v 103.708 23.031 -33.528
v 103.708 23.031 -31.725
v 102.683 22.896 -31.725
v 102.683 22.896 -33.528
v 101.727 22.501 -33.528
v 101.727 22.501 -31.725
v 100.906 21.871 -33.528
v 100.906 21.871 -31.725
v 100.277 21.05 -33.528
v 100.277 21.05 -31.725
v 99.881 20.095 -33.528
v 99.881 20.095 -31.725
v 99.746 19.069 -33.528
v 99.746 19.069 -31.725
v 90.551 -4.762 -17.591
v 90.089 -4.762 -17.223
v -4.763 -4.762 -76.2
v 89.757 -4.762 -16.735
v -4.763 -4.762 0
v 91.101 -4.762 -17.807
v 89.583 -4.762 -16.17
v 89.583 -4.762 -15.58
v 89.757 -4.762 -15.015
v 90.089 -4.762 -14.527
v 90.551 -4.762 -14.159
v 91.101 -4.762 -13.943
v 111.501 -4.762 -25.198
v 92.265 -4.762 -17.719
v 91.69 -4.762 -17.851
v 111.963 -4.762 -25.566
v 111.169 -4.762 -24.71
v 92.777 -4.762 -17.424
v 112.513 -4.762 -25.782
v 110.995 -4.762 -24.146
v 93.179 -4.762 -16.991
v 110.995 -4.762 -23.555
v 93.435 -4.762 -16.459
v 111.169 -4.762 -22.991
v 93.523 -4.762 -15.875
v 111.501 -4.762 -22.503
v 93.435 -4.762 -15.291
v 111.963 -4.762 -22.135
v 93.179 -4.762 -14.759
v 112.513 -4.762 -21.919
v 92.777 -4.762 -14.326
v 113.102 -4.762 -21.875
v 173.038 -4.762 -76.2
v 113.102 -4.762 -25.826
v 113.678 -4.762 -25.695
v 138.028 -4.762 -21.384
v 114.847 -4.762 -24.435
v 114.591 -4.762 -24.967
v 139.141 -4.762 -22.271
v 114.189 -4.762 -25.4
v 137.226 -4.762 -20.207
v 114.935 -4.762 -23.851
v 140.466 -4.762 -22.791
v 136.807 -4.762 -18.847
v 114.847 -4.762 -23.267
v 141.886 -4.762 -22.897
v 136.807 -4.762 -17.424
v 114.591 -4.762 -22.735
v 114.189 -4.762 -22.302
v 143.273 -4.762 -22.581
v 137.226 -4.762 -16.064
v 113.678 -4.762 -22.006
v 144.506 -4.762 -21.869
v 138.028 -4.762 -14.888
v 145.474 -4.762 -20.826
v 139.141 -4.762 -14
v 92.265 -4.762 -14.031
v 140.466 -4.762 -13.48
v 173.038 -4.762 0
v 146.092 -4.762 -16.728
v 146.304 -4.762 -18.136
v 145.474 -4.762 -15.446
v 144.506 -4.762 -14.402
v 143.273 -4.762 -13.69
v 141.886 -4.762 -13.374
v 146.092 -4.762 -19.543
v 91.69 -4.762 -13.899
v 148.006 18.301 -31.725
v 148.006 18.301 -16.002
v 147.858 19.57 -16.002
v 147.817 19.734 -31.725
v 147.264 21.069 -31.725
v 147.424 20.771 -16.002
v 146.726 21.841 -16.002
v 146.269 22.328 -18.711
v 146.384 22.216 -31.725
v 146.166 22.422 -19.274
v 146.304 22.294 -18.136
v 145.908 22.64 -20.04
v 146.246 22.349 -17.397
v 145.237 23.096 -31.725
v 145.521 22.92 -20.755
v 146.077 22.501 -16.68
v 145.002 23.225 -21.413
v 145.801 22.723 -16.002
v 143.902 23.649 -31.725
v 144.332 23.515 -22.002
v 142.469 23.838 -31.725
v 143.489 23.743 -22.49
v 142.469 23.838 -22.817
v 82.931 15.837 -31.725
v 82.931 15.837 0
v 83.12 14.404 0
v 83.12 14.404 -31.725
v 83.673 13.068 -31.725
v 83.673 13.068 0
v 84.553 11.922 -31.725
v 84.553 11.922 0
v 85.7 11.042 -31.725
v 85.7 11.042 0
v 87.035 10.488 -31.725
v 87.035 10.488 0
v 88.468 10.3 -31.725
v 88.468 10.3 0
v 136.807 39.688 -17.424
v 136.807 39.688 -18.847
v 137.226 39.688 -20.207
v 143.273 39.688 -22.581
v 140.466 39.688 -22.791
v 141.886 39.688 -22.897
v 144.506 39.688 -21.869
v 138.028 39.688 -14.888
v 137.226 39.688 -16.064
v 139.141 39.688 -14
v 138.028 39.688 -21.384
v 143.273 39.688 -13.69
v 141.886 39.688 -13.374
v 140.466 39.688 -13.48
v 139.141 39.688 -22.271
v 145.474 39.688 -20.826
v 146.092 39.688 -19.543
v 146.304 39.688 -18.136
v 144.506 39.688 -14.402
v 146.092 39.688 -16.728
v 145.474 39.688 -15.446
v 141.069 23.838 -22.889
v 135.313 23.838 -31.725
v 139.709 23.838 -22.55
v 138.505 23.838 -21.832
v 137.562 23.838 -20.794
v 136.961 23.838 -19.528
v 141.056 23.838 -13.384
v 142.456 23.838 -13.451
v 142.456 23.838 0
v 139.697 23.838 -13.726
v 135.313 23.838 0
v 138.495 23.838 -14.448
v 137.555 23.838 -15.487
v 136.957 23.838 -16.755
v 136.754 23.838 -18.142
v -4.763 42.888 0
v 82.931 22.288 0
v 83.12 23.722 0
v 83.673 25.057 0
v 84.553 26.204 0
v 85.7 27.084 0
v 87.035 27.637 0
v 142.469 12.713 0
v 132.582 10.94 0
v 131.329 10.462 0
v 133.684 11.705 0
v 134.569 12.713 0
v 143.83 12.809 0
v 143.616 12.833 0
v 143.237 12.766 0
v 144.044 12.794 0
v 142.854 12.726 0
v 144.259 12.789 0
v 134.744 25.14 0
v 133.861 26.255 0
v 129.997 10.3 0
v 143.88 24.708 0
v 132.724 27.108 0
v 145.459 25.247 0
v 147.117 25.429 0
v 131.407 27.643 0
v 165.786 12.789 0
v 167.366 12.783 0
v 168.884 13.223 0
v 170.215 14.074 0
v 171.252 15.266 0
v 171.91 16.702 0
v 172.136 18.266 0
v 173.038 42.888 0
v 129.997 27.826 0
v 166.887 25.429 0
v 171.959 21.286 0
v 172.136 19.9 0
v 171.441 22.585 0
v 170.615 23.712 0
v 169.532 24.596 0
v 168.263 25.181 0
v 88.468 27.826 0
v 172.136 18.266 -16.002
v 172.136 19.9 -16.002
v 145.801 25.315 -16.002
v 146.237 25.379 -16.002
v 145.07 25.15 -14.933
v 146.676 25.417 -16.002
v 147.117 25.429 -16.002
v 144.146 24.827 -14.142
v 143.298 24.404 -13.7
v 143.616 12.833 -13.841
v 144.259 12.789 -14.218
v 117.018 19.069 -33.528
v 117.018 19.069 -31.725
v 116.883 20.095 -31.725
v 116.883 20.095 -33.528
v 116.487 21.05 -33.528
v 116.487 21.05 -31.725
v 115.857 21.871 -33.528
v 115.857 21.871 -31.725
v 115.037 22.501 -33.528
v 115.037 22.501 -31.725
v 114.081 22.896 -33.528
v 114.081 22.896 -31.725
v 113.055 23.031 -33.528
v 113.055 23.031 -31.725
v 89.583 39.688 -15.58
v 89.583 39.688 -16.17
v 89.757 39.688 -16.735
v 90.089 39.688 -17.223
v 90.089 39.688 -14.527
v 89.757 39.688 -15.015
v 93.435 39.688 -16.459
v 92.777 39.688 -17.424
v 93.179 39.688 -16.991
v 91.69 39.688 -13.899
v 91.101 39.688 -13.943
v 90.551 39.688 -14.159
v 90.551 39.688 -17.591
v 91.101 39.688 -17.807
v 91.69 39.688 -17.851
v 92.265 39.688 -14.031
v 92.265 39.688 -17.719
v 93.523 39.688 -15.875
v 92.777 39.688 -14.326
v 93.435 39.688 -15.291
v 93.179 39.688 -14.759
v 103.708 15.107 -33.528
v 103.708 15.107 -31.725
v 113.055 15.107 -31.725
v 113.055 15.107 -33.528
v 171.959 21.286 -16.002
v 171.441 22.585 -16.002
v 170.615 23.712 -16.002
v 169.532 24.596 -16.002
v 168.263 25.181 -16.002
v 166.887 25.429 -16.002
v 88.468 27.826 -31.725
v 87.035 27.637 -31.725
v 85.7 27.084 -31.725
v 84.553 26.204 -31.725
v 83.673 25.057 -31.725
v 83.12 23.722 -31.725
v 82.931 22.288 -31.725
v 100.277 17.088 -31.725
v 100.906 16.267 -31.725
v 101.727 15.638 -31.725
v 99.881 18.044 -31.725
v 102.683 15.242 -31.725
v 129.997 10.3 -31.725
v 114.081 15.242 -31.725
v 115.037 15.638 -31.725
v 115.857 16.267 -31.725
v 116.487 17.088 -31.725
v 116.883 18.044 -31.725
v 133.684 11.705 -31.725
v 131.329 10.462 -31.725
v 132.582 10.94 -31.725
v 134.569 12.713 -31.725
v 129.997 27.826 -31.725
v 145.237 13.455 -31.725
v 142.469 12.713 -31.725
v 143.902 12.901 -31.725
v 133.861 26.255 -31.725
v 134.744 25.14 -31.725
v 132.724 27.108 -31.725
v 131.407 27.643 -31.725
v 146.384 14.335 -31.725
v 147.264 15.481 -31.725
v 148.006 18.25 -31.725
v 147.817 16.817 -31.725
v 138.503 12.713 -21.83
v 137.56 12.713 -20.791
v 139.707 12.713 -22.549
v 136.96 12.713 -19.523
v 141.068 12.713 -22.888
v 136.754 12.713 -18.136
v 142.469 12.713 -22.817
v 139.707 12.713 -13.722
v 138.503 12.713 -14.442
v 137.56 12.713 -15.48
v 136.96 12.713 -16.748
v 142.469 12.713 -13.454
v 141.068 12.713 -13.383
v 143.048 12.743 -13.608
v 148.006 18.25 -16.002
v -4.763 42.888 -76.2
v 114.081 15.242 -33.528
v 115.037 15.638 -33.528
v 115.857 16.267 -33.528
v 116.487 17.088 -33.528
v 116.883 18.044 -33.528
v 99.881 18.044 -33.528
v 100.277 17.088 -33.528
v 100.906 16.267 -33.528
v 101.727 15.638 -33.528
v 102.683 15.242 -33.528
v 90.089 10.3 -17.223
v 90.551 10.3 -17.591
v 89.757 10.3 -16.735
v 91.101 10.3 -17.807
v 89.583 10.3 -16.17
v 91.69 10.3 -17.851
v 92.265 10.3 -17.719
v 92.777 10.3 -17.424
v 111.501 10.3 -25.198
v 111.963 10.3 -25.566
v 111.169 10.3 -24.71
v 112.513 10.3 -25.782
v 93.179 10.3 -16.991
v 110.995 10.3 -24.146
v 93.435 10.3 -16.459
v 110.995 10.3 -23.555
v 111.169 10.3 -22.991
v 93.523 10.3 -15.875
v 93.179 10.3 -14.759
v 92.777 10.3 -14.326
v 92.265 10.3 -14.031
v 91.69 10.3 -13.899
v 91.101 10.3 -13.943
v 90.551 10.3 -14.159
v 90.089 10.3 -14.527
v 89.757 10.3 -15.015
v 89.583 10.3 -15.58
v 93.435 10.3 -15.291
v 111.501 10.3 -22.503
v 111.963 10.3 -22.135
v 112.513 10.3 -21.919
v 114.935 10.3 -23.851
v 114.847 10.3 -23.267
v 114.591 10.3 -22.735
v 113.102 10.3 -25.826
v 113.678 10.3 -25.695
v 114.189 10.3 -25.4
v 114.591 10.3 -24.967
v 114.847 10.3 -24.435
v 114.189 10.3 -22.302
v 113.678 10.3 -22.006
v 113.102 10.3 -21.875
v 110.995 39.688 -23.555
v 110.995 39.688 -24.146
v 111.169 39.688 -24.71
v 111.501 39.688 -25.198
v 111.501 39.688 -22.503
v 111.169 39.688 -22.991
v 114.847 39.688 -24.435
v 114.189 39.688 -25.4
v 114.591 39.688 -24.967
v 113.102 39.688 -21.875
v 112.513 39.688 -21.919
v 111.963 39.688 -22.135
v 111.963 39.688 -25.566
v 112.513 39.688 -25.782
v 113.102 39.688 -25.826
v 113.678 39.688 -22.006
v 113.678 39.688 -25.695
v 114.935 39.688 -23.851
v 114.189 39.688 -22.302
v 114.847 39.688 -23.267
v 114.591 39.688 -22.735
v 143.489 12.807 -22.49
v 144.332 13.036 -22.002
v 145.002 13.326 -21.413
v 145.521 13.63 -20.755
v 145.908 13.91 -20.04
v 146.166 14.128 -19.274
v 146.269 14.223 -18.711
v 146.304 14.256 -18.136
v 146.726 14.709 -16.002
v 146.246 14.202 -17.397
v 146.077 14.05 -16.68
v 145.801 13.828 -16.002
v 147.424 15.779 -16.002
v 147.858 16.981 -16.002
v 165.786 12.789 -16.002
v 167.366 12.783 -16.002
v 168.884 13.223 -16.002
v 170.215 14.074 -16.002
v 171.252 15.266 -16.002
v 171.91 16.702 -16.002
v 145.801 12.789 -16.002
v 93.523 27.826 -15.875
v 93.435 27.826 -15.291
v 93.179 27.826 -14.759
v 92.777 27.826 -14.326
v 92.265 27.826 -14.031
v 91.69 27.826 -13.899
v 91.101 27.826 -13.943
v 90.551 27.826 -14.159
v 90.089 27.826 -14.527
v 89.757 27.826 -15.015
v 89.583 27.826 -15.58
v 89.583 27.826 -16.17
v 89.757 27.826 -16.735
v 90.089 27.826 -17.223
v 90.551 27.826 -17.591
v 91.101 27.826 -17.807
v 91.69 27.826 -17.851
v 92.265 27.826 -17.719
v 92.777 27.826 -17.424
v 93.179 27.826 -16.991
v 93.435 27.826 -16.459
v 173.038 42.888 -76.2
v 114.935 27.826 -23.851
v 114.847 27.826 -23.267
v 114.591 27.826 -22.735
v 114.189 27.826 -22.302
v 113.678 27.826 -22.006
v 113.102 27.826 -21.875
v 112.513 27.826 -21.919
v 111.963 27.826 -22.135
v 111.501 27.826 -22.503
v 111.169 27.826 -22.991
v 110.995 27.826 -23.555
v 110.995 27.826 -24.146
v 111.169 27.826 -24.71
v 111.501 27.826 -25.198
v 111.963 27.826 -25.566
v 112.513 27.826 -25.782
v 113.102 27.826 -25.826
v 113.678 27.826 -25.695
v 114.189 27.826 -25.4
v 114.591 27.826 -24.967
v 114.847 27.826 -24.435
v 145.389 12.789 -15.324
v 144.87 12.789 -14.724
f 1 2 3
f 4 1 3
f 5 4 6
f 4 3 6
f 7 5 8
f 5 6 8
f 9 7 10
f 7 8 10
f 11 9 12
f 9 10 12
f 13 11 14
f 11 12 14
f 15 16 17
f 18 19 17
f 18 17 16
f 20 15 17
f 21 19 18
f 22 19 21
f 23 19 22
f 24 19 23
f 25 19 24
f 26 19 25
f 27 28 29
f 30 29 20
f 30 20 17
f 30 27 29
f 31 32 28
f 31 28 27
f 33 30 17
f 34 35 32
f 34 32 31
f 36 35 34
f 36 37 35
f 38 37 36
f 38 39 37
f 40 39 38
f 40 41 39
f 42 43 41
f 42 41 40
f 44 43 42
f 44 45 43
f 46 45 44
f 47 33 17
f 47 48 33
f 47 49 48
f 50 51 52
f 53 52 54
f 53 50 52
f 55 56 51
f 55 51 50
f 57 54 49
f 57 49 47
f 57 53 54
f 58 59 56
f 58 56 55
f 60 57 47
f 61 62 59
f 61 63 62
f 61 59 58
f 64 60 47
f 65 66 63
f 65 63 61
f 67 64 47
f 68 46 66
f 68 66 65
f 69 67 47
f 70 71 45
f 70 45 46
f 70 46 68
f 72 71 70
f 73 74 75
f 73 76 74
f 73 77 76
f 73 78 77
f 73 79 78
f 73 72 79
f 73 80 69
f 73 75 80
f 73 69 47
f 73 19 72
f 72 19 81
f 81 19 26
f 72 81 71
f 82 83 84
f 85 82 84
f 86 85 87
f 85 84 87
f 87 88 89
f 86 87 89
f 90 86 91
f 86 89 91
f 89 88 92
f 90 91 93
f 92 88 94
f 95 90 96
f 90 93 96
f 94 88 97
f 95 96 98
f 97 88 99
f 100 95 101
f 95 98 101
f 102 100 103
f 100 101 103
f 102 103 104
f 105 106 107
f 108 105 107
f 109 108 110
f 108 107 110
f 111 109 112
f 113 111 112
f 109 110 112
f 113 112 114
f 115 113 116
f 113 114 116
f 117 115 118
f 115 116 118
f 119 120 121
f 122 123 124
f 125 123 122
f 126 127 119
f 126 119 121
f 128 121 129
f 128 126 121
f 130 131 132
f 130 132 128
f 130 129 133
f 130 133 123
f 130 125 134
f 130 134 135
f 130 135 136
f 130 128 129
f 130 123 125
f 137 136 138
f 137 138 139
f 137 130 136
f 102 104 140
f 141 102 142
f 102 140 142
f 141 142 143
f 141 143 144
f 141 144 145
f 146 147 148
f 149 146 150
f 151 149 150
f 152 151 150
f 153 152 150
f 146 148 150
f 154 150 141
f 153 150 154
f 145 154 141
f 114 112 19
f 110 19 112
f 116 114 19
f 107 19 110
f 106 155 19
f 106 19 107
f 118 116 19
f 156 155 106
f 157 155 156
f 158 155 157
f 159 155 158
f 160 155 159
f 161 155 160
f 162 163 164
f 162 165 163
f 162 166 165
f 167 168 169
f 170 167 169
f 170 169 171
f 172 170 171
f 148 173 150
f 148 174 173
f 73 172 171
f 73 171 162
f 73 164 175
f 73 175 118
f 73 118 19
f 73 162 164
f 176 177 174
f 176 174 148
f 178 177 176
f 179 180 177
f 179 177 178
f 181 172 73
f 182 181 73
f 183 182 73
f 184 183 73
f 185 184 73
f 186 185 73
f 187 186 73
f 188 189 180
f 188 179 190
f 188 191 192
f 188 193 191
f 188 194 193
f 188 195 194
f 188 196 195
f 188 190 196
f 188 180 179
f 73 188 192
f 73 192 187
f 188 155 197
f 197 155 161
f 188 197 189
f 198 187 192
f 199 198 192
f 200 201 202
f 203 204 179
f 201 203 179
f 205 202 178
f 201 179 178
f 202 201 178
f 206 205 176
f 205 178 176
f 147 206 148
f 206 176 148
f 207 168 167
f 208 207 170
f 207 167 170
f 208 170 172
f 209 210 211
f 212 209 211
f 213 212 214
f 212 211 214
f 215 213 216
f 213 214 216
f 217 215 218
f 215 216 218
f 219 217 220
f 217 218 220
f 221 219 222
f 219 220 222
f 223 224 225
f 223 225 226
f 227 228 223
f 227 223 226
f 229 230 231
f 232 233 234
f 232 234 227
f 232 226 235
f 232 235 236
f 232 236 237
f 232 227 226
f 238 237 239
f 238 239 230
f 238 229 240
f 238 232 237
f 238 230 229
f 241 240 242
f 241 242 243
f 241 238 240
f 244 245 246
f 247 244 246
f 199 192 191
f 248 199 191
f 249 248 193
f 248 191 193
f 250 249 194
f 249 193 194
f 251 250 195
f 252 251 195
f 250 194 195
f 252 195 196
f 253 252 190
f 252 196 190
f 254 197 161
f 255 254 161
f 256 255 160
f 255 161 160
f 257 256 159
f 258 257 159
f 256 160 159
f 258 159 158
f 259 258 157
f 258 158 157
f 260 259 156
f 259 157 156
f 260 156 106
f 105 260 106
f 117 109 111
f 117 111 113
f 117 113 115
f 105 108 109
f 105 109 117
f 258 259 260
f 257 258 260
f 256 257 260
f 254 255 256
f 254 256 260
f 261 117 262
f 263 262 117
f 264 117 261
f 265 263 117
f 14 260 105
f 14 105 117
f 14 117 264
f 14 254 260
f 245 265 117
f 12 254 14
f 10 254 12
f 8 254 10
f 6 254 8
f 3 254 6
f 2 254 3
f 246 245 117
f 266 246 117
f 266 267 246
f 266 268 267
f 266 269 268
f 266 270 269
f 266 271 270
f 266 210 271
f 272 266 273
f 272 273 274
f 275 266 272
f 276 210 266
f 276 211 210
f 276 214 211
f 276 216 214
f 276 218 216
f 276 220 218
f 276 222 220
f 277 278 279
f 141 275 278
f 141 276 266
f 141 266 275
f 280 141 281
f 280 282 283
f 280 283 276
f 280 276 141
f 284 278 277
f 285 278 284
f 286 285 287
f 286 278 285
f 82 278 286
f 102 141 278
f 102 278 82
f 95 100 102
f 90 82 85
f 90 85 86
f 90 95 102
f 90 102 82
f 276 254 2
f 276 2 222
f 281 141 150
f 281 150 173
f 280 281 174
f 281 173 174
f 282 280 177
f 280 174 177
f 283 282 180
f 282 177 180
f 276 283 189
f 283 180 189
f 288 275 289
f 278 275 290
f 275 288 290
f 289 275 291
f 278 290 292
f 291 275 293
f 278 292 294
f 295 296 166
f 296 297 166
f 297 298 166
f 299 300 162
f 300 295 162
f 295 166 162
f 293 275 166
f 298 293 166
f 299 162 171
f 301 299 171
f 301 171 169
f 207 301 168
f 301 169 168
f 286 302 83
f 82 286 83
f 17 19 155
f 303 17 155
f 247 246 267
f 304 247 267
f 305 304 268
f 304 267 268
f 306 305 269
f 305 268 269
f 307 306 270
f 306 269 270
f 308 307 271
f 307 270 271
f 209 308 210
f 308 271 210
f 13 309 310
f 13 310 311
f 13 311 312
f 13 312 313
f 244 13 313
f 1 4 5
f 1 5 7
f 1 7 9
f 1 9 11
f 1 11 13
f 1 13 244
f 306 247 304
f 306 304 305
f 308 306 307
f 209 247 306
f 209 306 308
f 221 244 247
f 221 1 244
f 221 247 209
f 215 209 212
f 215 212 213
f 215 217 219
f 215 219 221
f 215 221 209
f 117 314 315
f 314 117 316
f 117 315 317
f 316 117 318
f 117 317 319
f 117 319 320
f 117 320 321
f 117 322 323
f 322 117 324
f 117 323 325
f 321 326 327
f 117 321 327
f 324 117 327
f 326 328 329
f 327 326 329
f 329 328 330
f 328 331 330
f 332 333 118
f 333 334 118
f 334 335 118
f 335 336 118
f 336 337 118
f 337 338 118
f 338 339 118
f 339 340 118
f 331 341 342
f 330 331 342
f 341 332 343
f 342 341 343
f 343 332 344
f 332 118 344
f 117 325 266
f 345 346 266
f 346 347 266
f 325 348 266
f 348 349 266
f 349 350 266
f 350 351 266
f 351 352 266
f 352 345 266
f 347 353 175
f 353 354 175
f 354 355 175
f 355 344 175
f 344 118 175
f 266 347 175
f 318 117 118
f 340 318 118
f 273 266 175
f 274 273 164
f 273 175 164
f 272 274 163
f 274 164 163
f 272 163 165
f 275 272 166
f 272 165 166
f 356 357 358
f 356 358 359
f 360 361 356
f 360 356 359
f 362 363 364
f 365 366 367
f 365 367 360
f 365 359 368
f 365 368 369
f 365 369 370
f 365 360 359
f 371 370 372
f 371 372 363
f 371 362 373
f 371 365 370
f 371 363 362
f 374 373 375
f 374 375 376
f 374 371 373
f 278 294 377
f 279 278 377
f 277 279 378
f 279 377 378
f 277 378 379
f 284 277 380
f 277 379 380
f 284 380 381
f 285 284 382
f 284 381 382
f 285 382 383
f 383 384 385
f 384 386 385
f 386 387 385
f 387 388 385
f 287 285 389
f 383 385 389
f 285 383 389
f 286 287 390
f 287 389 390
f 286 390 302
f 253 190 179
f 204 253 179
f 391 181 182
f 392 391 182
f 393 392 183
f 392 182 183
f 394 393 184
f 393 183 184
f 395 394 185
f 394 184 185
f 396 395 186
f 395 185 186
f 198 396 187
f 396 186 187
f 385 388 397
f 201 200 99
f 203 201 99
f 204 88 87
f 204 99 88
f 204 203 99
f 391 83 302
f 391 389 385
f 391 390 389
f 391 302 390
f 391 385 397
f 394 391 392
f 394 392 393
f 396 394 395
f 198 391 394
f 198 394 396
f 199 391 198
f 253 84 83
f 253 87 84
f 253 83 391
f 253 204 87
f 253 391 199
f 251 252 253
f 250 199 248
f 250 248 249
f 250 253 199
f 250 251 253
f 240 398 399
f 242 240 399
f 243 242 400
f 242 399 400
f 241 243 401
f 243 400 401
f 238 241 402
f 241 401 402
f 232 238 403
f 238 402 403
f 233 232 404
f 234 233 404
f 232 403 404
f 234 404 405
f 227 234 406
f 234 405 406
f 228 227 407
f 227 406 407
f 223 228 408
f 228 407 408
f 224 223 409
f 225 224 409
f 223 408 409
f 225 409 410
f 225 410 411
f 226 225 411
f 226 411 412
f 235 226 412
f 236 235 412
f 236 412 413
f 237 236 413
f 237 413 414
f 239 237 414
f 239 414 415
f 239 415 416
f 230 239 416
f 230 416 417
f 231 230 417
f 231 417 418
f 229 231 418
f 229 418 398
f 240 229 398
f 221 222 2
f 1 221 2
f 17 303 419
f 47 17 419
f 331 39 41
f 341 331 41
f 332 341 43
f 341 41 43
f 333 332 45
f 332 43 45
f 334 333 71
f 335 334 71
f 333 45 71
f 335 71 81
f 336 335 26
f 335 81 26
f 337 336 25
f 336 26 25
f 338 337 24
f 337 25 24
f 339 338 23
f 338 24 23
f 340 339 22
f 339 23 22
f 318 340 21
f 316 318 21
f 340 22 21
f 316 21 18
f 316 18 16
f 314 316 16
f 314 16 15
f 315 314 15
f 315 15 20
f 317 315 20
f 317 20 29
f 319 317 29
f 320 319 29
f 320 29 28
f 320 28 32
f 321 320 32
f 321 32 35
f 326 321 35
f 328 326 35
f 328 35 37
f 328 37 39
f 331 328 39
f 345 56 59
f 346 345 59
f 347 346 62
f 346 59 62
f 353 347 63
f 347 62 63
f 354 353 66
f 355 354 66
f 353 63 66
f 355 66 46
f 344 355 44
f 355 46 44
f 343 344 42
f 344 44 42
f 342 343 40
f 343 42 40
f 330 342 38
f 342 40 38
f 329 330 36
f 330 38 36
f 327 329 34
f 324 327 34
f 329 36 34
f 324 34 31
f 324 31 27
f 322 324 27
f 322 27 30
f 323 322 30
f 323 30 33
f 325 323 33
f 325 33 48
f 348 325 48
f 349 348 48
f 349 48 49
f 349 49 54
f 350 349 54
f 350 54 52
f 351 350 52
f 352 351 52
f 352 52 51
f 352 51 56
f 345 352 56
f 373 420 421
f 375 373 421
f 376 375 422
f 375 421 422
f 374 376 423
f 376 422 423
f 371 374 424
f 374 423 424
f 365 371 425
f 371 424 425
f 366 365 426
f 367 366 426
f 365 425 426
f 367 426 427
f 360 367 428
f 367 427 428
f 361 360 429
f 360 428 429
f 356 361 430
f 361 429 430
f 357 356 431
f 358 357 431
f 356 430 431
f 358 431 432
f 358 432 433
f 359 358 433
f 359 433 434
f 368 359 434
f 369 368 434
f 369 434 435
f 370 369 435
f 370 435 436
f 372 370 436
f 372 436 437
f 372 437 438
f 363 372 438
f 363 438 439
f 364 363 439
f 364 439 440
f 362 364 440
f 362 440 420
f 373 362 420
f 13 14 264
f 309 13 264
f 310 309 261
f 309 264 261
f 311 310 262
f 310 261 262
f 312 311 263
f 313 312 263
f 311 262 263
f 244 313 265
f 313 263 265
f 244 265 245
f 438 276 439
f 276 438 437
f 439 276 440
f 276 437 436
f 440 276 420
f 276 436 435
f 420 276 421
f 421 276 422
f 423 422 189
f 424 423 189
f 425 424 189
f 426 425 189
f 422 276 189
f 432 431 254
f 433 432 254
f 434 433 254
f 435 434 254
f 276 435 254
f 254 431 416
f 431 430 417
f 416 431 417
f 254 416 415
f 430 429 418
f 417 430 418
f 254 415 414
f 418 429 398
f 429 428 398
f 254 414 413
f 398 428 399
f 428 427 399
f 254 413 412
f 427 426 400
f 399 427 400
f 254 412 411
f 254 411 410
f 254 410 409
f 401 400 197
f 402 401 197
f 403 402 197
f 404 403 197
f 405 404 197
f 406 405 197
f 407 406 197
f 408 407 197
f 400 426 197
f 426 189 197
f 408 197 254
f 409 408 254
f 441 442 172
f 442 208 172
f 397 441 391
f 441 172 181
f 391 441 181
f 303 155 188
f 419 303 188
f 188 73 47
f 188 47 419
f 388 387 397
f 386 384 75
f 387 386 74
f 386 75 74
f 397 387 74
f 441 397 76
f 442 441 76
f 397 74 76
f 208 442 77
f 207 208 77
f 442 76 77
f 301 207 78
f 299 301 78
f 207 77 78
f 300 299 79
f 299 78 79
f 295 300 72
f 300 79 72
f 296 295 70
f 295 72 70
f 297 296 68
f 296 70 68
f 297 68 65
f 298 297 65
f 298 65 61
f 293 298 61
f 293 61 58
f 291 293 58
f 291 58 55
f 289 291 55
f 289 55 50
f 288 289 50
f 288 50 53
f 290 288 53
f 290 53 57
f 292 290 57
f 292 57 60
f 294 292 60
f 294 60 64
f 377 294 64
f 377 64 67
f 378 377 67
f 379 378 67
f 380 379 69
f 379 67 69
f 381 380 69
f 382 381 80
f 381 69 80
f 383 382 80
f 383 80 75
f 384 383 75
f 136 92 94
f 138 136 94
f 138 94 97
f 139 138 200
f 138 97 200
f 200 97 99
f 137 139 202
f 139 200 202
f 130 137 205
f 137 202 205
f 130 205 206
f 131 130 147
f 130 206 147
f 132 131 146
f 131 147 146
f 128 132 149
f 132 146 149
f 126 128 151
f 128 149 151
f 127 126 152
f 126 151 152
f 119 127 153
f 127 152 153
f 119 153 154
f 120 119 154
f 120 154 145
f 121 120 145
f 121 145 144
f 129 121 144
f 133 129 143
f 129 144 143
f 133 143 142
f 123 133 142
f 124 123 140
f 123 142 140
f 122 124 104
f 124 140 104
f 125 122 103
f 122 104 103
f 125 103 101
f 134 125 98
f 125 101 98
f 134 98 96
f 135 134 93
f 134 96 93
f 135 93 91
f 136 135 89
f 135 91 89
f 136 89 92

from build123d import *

# Parameters (mm, degrees)
F0_W      = 177.8
F0_H      = 47.6504
F1_DEPTH  = 76.2
F2_R      = 4.7752
F2_R_2    = 1.9812
F3_DEPTH  = 44.45
F5_DEPTH  = 16.002
F7_DEPTH  = 33.528
F9_DEPTH  = 31.7246
F11_DEPTH = 31.7246


# Not quite as in the source:
# - a feature names something its author has since deleted; it is built from what else it names


with BuildPart() as f1:
    # F0 (on Top) → F1 (new body)
    with BuildSketch(Plane.XY):
        with Locations((84.1375, 19.0627)):
            Rectangle(F0_W, F0_H)
    extrude(amount=-F1_DEPTH)

    # F2 (on face) → F3 (cut)
    with BuildSketch(Plane.XZ.offset(4.7625)):
        with Locations((141.5288, -18.1356)):
            Circle(F2_R)
        with Locations((112.9538, -23.8506)):
            Circle(F2_R_2)
        with Locations((91.5416, -15.875)):
            Circle(F2_R_2)
    extrude(amount=-F3_DEPTH, mode=Mode.SUBTRACT)

    # F4 (on face) → F5 (cut)
    with BuildSketch(Plane.XY):
        with BuildLine():
            Line((172.1358, 18.2664336953), (172.1358, 19.8998040895))
            ThreePointArc((172.1358, 19.8998040895), (170.6147547927, 23.7117700549), (166.887268424, 25.4294744577))
            Line((166.887268424, 25.4294744577), (147.1168, 25.4294744577))
            ThreePointArc((147.1168, 25.4294744577), (141.7286463274, 23.1976281303), (139.4968, 17.8094744577))
            Line((139.4968, 17.8094744577), (139.4968, 17.5517135975))
            ThreePointArc((139.4968, 17.5517135975), (140.8917039546, 14.1841175521), (144.2593, 12.7892135975))
            Line((144.2593, 12.7892135975), (165.7858, 12.7892135975))
            ThreePointArc((165.7858, 12.7892135975), (170.2152246474, 14.0735098945), (172.1358, 18.2664336953))
        make_face()
    extrude(amount=-F5_DEPTH, mode=Mode.SUBTRACT)

    # F6 (on face) → F7 (cut)
    with BuildSketch(Plane.XY):
        with BuildLine():
            Line((113.0554, 23.03145), (103.7082, 23.03145))
            ThreePointArc((103.7082, 23.03145), (100.9063600902, 21.8708899098), (99.7458, 19.06905))
            ThreePointArc((99.7458, 19.06905), (100.9063600902, 16.2672100902), (103.7082, 15.10665))
            Line((103.7082, 15.10665), (113.0554, 15.10665))
            ThreePointArc((113.0554, 15.10665), (115.8572399098, 16.2672100902), (117.0178, 19.06905))
            ThreePointArc((117.0178, 19.06905), (115.8572399098, 21.8708899098), (113.0554, 23.03145))
        make_face()
    extrude(amount=-F7_DEPTH, mode=Mode.SUBTRACT)

    # F8 (on face) → F9 (cut)
    with BuildSketch(Plane.XY):
        with BuildLine():
            Line((129.9972, 27.8257), (88.4682, 27.8257))
            ThreePointArc((88.4682, 27.8257), (84.5528083312, 26.2038916688), (82.931, 22.2885))
            Line((82.931, 22.2885), (82.931, 15.8369))
            ThreePointArc((82.931, 15.8369), (84.5528083312, 11.9215083312), (88.4682, 10.2997))
            Line((88.4682, 10.2997), (129.9972, 10.2997))
            ThreePointArc((129.9972, 10.2997), (133.9125916688, 11.9215083312), (135.5344, 15.8369))
            Line((135.5344, 15.8369), (135.5344, 22.2885))
            ThreePointArc((135.5344, 22.2885), (133.9125916688, 26.2038916688), (129.9972, 27.8257))
        make_face()
    extrude(amount=-F9_DEPTH, mode=Mode.SUBTRACT)

    # F10 (on face) → F11 (cut)
    with BuildSketch(Plane.XY):
        with BuildLine():
            Line((142.4686, 23.8379), (134.5240552125, 23.8379))
            ThreePointArc((134.5240552125, 23.8379), (132.2789911822, 22.9079640303), (131.3490552125, 20.6629))
            Line((131.3490552125, 20.6629), (131.3490552125, 15.8877))
            ThreePointArc((131.3490552125, 15.8877), (132.2789911822, 13.6426359697), (134.5240552125, 12.7127))
            Line((134.5240552125, 12.7127), (142.4686, 12.7127))
            ThreePointArc((142.4686, 12.7127), (146.3839916688, 14.3345083312), (148.0058, 18.2499))
            Line((148.0058, 18.2499), (148.0058, 18.3007))
            ThreePointArc((148.0058, 18.3007), (146.3839916688, 22.2160916688), (142.4686, 23.8379))
        make_face()
    extrude(amount=-F11_DEPTH, mode=Mode.SUBTRACT)


solid = f1.part
